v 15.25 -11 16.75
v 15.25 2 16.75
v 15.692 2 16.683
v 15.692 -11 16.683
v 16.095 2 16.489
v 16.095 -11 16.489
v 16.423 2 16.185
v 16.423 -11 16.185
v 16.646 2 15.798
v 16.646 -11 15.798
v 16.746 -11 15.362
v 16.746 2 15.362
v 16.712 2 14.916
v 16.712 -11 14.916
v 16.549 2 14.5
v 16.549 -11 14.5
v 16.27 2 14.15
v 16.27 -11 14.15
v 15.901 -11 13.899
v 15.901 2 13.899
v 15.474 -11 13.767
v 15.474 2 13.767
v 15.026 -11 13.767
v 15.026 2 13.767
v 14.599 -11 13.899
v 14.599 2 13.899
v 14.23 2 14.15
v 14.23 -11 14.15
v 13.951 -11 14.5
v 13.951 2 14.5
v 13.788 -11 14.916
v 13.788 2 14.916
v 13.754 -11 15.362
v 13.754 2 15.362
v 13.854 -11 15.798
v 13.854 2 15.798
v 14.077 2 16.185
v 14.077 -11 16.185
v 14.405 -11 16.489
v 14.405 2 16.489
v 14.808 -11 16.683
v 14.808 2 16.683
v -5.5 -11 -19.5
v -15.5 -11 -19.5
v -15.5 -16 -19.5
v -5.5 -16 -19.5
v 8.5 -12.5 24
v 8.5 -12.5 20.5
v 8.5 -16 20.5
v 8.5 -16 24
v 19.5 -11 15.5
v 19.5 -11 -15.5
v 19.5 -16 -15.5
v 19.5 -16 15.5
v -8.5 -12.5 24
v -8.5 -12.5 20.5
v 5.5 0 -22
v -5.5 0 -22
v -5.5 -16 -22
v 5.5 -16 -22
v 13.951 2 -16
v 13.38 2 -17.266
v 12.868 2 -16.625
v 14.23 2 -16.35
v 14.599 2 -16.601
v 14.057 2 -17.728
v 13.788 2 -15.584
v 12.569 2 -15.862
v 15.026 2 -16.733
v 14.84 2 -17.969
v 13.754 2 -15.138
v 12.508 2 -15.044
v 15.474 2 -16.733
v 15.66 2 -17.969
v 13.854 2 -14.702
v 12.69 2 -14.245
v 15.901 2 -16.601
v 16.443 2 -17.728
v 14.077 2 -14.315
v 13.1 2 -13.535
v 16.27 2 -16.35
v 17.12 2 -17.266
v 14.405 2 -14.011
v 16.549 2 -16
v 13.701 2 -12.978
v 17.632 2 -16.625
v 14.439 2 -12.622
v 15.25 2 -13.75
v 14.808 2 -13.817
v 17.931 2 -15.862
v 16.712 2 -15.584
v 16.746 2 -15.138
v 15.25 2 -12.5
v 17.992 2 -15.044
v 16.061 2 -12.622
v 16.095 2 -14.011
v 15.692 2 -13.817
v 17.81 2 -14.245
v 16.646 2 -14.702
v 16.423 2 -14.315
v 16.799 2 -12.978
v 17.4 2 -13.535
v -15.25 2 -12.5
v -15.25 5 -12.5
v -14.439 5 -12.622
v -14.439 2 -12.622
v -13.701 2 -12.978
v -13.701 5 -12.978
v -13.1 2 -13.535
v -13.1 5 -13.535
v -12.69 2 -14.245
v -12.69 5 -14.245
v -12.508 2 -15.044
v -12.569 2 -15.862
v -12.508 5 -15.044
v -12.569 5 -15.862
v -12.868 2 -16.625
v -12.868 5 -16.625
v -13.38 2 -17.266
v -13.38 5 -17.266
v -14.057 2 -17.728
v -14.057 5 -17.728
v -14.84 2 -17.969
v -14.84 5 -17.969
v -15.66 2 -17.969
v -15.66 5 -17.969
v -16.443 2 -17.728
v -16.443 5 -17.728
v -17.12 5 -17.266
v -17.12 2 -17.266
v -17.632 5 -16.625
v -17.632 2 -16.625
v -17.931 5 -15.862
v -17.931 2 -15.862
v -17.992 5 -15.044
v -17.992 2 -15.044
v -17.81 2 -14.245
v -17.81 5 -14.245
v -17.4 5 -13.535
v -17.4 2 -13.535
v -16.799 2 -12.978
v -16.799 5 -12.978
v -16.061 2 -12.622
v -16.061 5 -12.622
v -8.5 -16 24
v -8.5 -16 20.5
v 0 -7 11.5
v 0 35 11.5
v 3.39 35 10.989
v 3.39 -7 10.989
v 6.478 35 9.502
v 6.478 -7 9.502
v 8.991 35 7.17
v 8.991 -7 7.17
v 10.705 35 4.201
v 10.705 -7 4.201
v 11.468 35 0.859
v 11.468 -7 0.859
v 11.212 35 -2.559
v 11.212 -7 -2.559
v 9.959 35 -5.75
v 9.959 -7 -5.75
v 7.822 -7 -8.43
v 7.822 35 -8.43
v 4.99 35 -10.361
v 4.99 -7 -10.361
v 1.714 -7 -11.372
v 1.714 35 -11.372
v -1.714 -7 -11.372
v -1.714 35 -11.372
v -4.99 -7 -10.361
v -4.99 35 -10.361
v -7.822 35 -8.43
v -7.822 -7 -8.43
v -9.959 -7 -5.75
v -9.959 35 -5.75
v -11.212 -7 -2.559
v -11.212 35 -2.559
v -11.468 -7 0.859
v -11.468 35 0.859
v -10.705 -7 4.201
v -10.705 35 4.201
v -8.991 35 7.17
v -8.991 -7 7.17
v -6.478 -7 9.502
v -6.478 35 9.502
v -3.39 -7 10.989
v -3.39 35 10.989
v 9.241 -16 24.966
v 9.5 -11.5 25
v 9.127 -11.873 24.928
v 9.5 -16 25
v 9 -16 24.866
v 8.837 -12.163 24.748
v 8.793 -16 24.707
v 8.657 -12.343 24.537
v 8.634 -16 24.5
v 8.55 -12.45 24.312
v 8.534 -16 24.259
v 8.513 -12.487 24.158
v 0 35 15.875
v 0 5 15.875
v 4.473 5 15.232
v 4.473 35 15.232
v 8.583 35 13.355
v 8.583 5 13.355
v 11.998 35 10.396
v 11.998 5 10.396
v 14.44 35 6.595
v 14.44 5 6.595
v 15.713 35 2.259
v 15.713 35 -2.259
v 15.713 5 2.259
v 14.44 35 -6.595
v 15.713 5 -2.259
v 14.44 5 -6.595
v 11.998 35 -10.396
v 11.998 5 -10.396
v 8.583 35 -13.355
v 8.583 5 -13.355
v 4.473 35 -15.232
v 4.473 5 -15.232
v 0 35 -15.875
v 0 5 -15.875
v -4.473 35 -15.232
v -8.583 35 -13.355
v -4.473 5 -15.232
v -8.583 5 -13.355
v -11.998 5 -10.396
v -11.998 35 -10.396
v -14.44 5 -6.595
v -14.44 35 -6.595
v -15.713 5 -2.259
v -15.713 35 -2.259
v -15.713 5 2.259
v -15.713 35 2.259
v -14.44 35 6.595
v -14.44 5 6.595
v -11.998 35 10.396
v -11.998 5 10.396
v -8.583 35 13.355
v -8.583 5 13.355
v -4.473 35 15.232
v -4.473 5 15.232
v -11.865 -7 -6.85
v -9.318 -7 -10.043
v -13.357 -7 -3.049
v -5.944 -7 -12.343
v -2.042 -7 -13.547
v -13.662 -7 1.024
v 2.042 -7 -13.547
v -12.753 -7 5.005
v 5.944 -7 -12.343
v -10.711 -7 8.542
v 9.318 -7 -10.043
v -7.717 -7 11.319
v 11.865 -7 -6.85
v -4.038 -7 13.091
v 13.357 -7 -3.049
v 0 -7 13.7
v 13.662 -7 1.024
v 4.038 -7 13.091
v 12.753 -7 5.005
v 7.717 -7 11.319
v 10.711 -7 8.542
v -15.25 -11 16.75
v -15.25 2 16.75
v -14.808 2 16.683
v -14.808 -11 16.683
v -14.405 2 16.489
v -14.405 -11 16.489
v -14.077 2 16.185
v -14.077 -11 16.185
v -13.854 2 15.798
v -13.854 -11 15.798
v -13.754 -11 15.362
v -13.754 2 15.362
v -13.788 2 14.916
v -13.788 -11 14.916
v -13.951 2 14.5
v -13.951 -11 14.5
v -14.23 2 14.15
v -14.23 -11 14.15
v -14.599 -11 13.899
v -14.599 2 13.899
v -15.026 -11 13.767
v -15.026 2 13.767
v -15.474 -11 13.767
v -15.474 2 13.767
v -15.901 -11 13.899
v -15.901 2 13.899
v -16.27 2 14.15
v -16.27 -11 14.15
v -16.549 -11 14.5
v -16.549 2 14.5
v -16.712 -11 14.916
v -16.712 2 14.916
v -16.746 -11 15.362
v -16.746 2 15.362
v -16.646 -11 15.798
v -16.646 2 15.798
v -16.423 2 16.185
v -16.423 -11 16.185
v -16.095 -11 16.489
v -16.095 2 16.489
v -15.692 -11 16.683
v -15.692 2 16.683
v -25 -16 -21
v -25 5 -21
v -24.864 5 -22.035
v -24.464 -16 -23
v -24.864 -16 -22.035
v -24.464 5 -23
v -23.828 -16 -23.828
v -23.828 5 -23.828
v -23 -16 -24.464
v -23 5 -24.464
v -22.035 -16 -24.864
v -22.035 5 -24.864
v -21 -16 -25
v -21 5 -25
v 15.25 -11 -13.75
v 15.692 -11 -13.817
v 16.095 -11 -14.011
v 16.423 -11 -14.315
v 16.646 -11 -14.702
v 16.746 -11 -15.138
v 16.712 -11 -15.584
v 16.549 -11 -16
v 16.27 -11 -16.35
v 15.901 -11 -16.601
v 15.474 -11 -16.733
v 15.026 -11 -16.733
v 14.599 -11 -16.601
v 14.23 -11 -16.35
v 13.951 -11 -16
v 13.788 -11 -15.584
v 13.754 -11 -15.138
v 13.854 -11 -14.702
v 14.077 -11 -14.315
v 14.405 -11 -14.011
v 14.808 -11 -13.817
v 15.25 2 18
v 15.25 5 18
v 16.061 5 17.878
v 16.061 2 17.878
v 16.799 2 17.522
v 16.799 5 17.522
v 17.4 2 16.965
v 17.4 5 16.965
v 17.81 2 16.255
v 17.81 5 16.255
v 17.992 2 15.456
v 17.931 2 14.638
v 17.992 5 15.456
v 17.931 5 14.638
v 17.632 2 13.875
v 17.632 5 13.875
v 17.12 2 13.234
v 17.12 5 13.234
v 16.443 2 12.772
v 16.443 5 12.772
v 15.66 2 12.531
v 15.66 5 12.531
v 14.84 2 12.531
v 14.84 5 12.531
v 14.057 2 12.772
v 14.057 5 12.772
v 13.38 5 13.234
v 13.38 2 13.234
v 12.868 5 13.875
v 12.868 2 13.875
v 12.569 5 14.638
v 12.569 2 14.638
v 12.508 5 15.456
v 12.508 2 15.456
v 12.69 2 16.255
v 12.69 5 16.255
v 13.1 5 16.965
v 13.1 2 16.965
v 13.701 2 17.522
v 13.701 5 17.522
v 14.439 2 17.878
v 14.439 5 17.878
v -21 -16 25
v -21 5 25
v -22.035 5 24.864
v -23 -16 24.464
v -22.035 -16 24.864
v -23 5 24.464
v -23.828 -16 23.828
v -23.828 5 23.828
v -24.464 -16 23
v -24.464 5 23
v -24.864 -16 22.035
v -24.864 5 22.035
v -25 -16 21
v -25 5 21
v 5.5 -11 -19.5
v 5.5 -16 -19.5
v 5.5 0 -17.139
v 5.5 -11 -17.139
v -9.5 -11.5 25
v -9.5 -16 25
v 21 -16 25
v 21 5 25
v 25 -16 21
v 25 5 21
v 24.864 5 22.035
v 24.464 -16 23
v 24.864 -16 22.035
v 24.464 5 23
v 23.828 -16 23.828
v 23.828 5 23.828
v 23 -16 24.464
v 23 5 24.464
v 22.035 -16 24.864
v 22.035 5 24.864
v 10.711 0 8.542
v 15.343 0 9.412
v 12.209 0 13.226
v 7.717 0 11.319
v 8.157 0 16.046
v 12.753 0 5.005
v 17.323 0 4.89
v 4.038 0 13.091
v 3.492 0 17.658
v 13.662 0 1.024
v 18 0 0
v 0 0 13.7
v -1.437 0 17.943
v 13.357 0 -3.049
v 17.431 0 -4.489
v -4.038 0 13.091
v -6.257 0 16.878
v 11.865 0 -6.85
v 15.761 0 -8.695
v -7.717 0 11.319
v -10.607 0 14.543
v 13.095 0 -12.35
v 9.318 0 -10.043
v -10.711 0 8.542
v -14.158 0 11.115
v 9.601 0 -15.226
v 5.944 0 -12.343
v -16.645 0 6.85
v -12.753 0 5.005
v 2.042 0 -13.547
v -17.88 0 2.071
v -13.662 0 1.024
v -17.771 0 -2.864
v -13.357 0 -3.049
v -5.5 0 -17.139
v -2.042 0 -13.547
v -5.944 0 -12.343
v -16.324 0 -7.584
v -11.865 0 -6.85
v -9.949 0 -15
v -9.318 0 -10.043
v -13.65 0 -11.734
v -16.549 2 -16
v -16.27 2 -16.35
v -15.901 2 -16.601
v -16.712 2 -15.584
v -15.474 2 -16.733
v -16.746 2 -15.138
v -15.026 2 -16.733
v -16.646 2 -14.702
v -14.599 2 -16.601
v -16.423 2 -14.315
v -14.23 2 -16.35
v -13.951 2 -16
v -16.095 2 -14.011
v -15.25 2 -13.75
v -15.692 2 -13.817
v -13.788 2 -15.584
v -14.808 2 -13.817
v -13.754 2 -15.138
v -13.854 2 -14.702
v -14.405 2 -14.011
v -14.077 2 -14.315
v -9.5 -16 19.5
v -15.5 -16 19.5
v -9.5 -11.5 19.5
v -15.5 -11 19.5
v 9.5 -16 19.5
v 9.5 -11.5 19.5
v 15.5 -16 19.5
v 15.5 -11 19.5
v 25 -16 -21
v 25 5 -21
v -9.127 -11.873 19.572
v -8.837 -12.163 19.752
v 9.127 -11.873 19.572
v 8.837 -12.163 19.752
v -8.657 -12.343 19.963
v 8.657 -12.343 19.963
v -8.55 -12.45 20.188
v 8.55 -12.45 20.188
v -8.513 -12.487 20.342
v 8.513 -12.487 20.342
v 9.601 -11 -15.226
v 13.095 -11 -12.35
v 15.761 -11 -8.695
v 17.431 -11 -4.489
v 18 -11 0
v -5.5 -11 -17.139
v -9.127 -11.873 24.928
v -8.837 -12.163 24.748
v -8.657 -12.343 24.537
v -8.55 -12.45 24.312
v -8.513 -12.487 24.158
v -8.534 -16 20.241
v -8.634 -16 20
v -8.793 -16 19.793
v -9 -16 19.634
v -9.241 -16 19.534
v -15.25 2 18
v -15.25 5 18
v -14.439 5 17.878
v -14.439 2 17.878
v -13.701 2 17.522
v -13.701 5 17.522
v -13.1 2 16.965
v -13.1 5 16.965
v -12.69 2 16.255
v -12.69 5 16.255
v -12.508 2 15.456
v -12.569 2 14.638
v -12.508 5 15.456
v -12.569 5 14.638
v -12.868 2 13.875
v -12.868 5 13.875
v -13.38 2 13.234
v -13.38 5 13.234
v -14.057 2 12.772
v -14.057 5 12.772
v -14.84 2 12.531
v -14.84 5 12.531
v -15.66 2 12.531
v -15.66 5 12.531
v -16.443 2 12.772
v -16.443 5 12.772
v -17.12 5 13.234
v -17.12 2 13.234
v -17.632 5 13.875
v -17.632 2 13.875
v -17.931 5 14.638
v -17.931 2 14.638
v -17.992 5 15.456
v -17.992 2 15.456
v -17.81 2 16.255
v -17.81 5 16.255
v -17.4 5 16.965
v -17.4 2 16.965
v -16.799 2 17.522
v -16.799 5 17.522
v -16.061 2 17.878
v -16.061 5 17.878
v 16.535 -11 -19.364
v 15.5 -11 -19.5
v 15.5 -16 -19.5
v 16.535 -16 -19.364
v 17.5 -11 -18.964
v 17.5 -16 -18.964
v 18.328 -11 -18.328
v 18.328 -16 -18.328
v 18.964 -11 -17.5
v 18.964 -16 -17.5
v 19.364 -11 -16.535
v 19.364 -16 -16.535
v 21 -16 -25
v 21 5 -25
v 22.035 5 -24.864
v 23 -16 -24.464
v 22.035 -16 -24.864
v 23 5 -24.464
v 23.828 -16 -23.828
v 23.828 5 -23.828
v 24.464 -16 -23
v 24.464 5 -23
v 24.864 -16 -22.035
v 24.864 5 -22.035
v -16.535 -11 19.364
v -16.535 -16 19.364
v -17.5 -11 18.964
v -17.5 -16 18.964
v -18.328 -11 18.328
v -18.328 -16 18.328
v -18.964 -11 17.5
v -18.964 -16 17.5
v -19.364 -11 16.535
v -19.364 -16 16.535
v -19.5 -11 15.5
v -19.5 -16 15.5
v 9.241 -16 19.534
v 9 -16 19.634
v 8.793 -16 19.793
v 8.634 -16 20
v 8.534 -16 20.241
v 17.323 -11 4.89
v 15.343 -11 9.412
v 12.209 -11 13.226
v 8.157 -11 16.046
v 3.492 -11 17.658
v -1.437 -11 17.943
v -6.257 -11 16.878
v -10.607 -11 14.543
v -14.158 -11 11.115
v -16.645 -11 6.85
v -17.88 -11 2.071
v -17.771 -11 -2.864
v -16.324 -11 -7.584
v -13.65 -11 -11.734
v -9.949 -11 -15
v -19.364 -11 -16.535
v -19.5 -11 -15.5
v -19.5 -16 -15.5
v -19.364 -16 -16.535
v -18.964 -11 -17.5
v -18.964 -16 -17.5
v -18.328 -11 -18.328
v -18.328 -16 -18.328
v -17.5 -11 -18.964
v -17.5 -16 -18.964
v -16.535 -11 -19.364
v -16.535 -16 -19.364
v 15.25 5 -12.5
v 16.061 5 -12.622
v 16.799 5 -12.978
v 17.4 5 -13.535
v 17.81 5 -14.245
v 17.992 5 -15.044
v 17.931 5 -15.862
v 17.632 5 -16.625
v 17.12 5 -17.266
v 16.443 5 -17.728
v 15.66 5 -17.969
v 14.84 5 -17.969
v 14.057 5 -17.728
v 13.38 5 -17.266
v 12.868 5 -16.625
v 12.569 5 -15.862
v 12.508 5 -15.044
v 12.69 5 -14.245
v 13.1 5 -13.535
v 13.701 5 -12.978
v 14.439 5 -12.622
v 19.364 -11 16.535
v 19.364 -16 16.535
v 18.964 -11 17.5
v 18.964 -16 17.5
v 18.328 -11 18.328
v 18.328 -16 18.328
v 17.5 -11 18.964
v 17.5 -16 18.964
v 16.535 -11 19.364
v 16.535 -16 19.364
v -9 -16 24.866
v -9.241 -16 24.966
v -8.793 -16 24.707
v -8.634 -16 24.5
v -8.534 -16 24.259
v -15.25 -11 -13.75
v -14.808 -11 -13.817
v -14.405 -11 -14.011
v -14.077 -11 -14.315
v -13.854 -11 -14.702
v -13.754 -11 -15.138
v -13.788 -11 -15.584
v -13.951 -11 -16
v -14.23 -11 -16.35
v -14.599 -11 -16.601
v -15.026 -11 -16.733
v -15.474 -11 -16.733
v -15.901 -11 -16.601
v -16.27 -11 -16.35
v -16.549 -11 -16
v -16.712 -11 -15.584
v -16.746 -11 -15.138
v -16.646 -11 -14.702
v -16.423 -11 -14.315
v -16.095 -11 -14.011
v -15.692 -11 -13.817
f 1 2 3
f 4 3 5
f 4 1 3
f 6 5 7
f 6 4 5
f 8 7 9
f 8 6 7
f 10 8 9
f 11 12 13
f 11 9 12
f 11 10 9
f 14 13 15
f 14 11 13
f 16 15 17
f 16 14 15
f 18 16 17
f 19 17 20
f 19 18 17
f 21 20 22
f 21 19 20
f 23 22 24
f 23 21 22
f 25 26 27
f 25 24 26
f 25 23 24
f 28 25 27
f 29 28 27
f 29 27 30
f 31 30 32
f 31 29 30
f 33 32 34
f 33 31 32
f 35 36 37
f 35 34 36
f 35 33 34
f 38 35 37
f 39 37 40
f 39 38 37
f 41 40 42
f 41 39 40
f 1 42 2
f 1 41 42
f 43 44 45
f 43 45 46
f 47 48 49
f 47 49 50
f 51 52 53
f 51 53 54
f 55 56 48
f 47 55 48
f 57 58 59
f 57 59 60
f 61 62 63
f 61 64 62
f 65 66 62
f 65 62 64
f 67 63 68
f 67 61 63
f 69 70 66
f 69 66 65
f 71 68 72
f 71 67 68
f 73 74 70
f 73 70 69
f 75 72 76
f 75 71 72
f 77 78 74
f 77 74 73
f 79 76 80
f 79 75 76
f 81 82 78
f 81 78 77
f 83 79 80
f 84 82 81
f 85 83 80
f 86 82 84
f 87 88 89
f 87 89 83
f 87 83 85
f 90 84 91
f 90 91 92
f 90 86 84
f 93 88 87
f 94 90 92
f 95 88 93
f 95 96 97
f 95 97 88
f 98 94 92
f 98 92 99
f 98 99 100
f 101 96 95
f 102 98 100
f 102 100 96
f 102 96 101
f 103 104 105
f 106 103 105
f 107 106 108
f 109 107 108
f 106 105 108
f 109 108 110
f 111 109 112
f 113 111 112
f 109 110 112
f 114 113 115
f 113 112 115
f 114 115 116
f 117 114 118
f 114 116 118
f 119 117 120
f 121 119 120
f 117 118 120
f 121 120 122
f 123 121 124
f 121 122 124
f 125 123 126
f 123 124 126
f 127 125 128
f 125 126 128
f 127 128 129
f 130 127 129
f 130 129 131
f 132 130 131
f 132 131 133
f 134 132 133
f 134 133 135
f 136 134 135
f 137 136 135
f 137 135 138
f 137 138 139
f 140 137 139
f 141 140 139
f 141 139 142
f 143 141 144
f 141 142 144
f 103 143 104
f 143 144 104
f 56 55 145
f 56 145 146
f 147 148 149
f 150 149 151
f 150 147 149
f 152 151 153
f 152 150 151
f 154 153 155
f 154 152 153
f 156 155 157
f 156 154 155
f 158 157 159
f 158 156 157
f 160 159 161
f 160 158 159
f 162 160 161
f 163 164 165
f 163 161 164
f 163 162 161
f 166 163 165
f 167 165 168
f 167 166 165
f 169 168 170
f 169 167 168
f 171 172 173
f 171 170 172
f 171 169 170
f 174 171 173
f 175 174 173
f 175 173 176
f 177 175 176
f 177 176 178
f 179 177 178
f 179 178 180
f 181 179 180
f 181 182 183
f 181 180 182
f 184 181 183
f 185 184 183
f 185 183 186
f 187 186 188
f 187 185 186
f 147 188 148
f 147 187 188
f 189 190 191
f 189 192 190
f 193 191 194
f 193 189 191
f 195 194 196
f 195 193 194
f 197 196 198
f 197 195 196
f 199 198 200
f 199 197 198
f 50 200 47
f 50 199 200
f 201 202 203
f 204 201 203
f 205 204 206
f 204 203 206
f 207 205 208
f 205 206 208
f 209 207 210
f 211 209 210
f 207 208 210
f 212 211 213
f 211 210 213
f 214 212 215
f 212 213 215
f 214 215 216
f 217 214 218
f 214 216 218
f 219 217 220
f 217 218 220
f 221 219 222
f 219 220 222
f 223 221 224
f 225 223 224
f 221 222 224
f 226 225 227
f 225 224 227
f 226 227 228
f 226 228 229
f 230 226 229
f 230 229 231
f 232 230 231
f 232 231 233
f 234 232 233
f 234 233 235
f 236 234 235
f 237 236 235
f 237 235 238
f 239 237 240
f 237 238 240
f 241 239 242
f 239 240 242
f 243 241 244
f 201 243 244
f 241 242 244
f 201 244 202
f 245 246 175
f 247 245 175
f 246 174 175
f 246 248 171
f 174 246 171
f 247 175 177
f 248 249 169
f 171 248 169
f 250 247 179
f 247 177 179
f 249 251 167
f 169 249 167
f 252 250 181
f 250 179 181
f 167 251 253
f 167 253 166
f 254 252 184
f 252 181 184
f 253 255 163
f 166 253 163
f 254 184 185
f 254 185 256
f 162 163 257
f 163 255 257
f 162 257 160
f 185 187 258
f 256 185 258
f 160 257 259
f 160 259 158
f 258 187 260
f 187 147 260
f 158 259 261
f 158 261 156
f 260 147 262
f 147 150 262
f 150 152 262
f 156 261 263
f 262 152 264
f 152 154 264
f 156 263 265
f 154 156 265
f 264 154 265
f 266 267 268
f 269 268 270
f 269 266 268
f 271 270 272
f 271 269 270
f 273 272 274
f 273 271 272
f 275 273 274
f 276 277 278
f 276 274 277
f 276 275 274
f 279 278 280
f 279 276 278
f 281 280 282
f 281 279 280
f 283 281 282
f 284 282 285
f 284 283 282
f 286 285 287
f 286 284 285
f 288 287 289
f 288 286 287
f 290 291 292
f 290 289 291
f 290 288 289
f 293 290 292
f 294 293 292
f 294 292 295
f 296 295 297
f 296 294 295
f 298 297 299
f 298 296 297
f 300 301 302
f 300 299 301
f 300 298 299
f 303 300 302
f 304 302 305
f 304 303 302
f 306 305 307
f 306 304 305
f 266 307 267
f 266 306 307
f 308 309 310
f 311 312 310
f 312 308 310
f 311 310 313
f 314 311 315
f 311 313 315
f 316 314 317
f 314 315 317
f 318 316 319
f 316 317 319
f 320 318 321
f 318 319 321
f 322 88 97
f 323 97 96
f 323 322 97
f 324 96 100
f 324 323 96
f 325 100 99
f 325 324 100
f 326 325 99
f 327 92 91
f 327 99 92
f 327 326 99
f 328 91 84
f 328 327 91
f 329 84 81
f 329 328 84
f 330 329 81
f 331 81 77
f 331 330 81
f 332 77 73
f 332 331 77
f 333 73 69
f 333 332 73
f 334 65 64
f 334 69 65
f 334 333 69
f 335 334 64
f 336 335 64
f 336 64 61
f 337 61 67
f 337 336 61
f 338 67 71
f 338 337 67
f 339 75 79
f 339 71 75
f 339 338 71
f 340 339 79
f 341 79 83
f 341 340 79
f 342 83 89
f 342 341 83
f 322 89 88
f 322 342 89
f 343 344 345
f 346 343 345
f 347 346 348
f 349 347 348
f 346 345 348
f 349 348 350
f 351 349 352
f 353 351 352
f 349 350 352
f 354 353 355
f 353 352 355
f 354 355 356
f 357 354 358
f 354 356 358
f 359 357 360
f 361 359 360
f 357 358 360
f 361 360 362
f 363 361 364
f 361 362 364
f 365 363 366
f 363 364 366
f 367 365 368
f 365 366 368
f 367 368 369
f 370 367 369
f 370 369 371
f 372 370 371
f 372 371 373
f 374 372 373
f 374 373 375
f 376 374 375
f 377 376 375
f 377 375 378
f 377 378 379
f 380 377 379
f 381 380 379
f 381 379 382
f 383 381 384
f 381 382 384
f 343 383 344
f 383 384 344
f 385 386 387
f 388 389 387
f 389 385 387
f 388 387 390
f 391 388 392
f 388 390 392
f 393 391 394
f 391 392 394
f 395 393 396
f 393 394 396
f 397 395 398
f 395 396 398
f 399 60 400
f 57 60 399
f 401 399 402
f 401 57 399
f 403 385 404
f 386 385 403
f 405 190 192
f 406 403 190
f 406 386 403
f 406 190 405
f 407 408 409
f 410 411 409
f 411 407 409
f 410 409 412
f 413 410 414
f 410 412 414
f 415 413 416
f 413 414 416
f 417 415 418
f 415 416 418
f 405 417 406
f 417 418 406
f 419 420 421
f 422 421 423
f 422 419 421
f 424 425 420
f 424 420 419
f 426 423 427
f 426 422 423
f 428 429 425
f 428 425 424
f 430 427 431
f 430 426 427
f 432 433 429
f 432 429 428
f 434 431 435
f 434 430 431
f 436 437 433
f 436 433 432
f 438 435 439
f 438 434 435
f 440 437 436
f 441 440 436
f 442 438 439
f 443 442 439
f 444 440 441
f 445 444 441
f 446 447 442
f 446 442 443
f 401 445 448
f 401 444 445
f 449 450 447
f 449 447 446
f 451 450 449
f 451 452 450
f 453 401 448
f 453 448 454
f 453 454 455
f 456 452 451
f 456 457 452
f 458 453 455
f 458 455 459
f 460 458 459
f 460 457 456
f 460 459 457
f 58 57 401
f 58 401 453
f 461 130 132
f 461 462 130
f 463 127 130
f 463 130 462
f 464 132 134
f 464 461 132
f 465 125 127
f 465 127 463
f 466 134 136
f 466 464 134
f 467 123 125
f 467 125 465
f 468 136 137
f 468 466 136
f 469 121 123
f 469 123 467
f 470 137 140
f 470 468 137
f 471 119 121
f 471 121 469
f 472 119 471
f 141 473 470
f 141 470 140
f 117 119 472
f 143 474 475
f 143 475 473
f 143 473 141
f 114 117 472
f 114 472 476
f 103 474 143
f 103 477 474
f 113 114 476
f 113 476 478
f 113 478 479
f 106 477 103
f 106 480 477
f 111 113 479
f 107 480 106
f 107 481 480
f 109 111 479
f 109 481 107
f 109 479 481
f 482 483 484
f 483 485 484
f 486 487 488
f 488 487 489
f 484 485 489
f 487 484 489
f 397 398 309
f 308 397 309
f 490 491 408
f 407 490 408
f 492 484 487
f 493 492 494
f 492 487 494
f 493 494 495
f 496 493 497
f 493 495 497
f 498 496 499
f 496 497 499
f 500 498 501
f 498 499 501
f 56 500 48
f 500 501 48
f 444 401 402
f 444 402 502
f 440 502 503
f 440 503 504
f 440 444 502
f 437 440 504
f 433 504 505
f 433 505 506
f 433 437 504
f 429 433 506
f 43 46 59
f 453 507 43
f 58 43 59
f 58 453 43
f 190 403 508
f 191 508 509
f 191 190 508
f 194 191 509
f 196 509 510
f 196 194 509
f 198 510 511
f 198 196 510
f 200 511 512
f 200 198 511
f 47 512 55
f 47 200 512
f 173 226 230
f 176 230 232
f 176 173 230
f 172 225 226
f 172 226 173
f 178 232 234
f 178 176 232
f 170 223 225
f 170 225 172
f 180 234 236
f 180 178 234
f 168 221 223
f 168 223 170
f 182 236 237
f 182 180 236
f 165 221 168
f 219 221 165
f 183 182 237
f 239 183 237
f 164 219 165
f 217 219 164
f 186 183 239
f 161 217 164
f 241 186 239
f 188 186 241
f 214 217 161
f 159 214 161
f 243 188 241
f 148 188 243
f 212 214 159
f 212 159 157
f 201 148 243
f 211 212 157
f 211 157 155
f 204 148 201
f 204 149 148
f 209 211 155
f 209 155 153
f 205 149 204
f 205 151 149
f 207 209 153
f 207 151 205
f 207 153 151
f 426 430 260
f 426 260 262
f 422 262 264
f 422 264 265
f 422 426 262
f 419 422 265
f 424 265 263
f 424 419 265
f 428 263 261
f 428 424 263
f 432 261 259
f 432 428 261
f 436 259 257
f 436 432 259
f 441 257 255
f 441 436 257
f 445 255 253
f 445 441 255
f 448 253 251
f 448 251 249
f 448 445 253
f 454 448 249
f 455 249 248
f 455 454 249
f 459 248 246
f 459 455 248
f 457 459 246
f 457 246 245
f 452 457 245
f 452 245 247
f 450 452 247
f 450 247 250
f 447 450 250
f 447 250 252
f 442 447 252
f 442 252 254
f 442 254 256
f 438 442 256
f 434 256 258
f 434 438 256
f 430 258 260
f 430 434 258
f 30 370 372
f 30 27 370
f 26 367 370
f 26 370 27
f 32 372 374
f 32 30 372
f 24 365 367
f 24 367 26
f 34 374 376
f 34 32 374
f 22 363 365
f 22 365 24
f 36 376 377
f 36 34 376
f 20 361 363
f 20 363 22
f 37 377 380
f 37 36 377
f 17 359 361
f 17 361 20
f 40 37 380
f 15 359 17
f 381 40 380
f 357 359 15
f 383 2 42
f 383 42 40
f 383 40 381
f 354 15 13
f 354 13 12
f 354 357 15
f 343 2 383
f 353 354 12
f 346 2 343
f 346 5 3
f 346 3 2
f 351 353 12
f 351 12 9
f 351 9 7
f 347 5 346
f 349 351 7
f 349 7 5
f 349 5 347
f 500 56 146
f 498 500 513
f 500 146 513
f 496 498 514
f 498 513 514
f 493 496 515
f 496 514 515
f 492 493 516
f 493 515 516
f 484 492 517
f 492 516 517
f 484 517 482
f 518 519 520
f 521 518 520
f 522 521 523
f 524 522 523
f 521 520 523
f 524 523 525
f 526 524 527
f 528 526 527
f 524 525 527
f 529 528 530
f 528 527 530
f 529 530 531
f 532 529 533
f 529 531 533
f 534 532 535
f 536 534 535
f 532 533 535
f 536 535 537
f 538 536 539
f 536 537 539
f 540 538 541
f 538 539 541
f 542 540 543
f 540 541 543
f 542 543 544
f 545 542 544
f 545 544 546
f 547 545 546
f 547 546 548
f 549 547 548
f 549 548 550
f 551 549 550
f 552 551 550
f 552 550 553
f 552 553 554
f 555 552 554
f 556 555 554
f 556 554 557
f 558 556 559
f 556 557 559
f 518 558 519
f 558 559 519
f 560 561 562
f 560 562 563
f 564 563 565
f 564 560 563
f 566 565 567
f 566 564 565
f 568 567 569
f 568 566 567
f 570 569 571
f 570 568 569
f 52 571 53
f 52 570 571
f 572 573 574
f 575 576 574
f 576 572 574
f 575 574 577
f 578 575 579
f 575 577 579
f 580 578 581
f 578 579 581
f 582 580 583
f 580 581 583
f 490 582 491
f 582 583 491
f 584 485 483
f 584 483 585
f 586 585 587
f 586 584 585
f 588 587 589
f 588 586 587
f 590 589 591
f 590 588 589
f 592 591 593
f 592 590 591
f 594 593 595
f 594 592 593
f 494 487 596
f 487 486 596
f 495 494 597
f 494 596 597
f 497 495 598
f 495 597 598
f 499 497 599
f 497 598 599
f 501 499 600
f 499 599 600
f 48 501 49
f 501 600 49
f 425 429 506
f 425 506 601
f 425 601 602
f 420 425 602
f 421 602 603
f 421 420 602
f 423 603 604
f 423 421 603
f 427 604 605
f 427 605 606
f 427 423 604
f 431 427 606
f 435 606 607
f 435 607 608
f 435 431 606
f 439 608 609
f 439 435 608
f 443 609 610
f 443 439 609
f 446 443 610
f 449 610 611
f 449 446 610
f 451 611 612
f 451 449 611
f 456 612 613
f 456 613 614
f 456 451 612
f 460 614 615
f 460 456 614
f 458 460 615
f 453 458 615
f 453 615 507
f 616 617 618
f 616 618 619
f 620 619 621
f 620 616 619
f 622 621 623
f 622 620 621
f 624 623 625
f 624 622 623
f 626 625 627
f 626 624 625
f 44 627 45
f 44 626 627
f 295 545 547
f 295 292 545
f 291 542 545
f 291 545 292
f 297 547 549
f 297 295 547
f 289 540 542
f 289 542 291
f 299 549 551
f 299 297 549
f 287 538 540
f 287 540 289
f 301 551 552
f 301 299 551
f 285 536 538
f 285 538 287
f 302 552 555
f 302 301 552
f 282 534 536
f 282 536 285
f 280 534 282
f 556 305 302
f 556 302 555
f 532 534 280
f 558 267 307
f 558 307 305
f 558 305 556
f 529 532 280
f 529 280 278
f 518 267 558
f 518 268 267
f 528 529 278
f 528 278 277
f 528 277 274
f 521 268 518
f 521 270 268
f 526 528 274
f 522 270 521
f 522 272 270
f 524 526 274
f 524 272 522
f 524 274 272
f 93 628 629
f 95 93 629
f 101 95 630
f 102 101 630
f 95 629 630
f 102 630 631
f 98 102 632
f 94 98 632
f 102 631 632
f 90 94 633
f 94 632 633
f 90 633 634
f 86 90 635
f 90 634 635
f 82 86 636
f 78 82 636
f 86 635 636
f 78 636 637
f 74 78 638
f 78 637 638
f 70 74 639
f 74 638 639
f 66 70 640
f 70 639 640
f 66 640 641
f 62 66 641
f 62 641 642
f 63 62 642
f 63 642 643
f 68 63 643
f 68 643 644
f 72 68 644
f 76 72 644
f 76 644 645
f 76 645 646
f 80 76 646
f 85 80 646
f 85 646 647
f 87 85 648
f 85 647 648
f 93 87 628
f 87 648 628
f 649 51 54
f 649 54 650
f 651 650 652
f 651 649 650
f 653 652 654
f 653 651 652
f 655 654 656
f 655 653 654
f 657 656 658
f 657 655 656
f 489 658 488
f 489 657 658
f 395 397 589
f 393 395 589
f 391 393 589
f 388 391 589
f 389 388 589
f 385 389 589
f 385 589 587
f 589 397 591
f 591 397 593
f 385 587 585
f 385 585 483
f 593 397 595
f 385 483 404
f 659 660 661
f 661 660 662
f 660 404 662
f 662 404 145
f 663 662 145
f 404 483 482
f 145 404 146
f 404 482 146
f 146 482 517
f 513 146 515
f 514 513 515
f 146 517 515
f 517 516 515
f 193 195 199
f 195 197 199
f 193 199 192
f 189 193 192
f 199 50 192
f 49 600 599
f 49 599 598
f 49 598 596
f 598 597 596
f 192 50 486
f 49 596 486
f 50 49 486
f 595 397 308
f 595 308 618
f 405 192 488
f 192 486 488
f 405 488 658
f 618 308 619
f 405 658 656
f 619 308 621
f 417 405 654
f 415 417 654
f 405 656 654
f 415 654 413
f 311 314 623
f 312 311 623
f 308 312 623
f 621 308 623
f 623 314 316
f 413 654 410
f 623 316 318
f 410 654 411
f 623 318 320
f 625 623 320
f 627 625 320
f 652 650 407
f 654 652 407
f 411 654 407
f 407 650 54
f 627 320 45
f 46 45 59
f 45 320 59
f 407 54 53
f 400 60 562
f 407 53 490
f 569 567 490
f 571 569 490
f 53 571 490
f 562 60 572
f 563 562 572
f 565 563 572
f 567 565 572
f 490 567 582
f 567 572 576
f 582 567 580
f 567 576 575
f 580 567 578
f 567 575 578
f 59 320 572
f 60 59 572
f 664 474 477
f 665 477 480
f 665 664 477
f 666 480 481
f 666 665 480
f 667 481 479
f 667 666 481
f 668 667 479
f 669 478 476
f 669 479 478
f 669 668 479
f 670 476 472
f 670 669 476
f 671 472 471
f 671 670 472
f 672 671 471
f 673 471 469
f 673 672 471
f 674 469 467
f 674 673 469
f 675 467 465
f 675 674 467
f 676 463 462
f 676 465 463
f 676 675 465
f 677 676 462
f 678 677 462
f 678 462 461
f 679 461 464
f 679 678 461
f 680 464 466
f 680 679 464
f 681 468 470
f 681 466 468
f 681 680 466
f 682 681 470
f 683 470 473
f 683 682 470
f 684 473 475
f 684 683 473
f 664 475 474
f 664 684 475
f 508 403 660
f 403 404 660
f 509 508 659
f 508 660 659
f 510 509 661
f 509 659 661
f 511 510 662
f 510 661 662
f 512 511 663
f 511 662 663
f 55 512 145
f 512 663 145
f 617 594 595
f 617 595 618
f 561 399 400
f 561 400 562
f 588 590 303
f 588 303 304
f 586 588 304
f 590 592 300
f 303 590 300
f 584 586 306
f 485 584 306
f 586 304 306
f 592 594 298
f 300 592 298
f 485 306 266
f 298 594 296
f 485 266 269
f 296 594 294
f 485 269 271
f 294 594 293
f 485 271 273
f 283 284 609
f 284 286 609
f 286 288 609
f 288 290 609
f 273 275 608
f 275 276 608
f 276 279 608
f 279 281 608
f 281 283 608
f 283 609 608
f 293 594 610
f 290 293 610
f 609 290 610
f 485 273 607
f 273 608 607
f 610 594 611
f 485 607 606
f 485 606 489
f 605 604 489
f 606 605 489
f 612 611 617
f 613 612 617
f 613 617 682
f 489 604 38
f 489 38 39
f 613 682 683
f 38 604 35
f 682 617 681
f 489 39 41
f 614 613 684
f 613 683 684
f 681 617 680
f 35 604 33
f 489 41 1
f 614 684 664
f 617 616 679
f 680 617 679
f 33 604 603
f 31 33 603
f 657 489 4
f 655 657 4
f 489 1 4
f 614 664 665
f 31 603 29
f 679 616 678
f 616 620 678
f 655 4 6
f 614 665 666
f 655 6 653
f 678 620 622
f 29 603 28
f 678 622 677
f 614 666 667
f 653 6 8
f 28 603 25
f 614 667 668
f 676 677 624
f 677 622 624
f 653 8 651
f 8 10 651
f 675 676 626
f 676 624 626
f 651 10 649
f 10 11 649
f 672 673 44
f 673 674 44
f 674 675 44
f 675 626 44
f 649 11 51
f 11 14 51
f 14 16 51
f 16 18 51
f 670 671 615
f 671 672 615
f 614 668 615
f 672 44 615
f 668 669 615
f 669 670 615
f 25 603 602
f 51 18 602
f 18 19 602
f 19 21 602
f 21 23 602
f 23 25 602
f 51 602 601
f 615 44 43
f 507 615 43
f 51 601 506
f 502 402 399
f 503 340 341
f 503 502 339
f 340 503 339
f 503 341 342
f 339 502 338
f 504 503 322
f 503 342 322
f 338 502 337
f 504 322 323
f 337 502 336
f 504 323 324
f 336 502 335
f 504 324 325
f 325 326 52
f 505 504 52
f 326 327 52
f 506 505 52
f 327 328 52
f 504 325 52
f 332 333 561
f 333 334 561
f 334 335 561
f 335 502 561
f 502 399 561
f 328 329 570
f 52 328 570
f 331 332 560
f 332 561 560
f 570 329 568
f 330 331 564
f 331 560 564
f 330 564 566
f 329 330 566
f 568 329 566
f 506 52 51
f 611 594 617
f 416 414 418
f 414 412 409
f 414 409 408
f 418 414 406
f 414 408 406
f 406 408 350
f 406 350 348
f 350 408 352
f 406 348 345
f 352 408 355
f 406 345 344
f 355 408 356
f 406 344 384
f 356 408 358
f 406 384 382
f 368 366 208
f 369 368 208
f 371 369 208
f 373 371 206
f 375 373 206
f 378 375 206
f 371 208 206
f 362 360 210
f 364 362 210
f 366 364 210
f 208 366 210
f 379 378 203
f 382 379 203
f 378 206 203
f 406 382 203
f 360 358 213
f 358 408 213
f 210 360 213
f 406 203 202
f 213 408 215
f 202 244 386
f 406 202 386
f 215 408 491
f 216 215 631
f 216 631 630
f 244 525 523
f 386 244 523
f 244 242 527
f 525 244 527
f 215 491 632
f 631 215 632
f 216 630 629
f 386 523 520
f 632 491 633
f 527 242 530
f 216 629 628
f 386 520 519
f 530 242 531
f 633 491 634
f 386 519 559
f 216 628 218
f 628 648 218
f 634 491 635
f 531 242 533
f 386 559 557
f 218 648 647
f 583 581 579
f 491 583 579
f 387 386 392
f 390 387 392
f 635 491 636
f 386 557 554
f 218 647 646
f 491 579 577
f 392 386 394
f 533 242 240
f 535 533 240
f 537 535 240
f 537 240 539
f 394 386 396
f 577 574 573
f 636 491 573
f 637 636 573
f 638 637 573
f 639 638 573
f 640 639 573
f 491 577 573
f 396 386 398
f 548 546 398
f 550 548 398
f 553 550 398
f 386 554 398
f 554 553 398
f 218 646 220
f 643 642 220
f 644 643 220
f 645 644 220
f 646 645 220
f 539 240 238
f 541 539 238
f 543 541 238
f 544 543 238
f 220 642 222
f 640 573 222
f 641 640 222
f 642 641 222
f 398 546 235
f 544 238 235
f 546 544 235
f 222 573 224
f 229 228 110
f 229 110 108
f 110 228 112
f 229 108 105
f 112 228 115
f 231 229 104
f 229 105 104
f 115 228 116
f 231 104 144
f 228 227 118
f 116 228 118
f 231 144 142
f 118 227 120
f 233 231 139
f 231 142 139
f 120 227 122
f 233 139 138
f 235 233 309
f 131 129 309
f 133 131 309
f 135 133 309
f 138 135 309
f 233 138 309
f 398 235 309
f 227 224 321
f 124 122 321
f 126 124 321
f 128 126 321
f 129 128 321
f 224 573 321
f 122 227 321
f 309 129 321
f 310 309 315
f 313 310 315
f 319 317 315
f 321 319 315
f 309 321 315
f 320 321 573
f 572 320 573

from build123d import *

# Parameters (mm, degrees)
BOSS_EXTRUDE1_DEPTH     = 16
SKETCH4_3_R             = 2.75
SKETCH4_3_R_2           = 1.5
BOSS_EXTRUDE2_DEPTH     = 11
SKETCH4_4_R             = 13.7
BOSS_EXTRUDE3_DEPTH     = 7
BOSS_EXTRUDE4_START     = 5
BOSS_EXTRUDE4_DEPTH     = 5
BOSS_EXTRUDE5_START     = 5
SKETCH4_6_R             = 15.875
BOSS_EXTRUDE5_DEPTH     = 30
CUT_EXTRUDE1_DEPTH      = 50.749371855
CUT_EXTRUDE1_DEPTH_BACK = 7
SKETCH4_7_R             = 11.5
CUT_EXTRUDE4_DEPTH      = 50.749371855
CUT_EXTRUDE4_DEPTH_BACK = 50.749371855
SKETCH4_8_R             = 1.5
CUT_EXTRUDE5_START      = 5
SKETCH4_9_R             = 2.75
CUT_EXTRUDE5_DEPTH      = 3
SKETCH4_10_W            = 17
SKETCH4_10_H            = 5.5
BOSS_EXTRUDE6_DEPTH     = 12.5
FILLET1_R               = 1


with BuildPart() as part:
    # Sketch4 → Boss-Extrude1 (new body)
    with BuildSketch(Plane(origin=(0, 0, 0), x_dir=(1, 0, 0), z_dir=(0, 1, 0))):
        with BuildLine():
            Line((8.5, -25), (21, -25))
            ThreePointArc((21, -25), (23.828427125, -23.828427125), (25, -21))
            Line((25, -21), (25, 21))
            ThreePointArc((25, 21), (23.828427125, 23.828427125), (21, 25))
            Line((21, 25), (-21, 25))
            ThreePointArc((-21, 25), (-23.828427125, 23.828427125), (-25, 21))
            Line((-25, 21), (-25, -21))
            ThreePointArc((-25, -21), (-23.828427125, -23.828427125), (-21, -25))
            Line((-21, -25), (-8.5, -25))
            Line((-8.5, -25), (-8.5, -19.5))
            Line((-8.5, -19.5), (-15.5, -19.5))
            ThreePointArc((-15.5, -19.5), (-18.328427125, -18.328427125), (-19.5, -15.5))
            Line((-19.5, -15.5), (-19.5, 15.5))
            ThreePointArc((-19.5, 15.5), (-18.328427125, 18.328427125), (-15.5, 19.5))
            Line((-15.5, 19.5), (-5.5, 19.5))
            Line((-5.5, 19.5), (-5.5, 22))
            Line((-5.5, 22), (5.5, 22))
            Line((5.5, 22), (5.5, 19.5))
            Line((5.5, 19.5), (15.5, 19.5))
            ThreePointArc((15.5, 19.5), (18.328427125, 18.328427125), (19.5, 15.5))
            Line((19.5, 15.5), (19.5, -15.5))
            ThreePointArc((19.5, -15.5), (18.328427125, -18.328427125), (15.5, -19.5))
            Line((15.5, -19.5), (8.5, -19.5))
            Line((8.5, -19.5), (8.5, -25))
        make_face()
    extrude(amount=-BOSS_EXTRUDE1_DEPTH)

    # Sketch4<3> → Boss-Extrude2 (add)
    # profile 1 of 7: a face of its own
    with BuildSketch(Plane(origin=(0, 0, 0), x_dir=(1, 0, 0), z_dir=(0, 1, 0))):
        with BuildLine():
            Line((-8.5, -19.5), (8.5, -19.5))
            Line((8.5, -19.5), (15.5, -19.5))
            ThreePointArc((15.5, -19.5), (18.328427125, -18.328427125), (19.5, -15.5))
            Line((19.5, -15.5), (19.5, 15.5))
            ThreePointArc((19.5, 15.5), (18.328427125, 18.328427125), (15.5, 19.5))
            Line((15.5, 19.5), (5.5, 19.5))
            Line((5.5, 19.5), (5.5, 17.139136501))
            ThreePointArc((5.5, 17.139136501), (14.543039572, 10.606601718), (18, 0))
            ThreePointArc((18, 0), (-10.606601718, -14.543039572), (-5.5, 17.139136501))
            Line((-5.5, 17.139136501), (-5.5, 19.5))
            Line((-5.5, 19.5), (-15.5, 19.5))
            ThreePointArc((-15.5, 19.5), (-18.328427125, 18.328427125), (-19.5, 15.5))
            Line((-19.5, 15.5), (-19.5, -15.5))
            ThreePointArc((-19.5, -15.5), (-18.328427125, -18.328427125), (-15.5, -19.5))
            Line((-15.5, -19.5), (-8.5, -19.5))
        make_face()
        with Locations((-15.25, -15.25)):
            Circle(SKETCH4_3_R, mode=Mode.SUBTRACT)
        with Locations((15.25, -15.25)):
            Circle(SKETCH4_3_R, mode=Mode.SUBTRACT)
        with Locations((-15.25, 15.25)):
            Circle(SKETCH4_3_R, mode=Mode.SUBTRACT)
        with Locations((15.25, 15.25)):
            Circle(SKETCH4_3_R, mode=Mode.SUBTRACT)
    # profile 2 of 7: a face of its own
    with BuildSketch(Plane(origin=(0, 0, 0), x_dir=(1, 0, 0), z_dir=(0, 1, 0))):
        with BuildLine():
            Line((-8.5, -19.5), (8.5, -19.5))
            Line((8.5, -19.5), (15.5, -19.5))
            ThreePointArc((15.5, -19.5), (18.328427125, -18.328427125), (19.5, -15.5))
            Line((19.5, -15.5), (19.5, 15.5))
            ThreePointArc((19.5, 15.5), (18.328427125, 18.328427125), (15.5, 19.5))
            Line((15.5, 19.5), (5.5, 19.5))
            Line((5.5, 19.5), (5.5, 17.139136501))
            ThreePointArc((5.5, 17.139136501), (14.543039572, 10.606601718), (18, 0))
            ThreePointArc((18, 0), (-10.606601718, -14.543039572), (-5.5, 17.139136501))
            Line((-5.5, 17.139136501), (-5.5, 19.5))
            Line((-5.5, 19.5), (-15.5, 19.5))
            ThreePointArc((-15.5, 19.5), (-18.328427125, 18.328427125), (-19.5, 15.5))
            Line((-19.5, 15.5), (-19.5, -15.5))
            ThreePointArc((-19.5, -15.5), (-18.328427125, -18.328427125), (-15.5, -19.5))
            Line((-15.5, -19.5), (-8.5, -19.5))
        make_face()
        with Locations((-15.25, -15.25)):
            Circle(SKETCH4_3_R, mode=Mode.SUBTRACT)
        with Locations((15.25, -15.25)):
            Circle(SKETCH4_3_R, mode=Mode.SUBTRACT)
        with Locations((-15.25, 15.25)):
            Circle(SKETCH4_3_R, mode=Mode.SUBTRACT)
        with Locations((15.25, 15.25)):
            Circle(SKETCH4_3_R, mode=Mode.SUBTRACT)
    # profile 3 of 7: a face of its own
    with BuildSketch(Plane(origin=(0, 0, 0), x_dir=(1, 0, 0), z_dir=(0, 1, 0))):
        with BuildLine():
            Line((-8.5, -19.5), (8.5, -19.5))
            Line((8.5, -19.5), (15.5, -19.5))
            ThreePointArc((15.5, -19.5), (18.328427125, -18.328427125), (19.5, -15.5))
            Line((19.5, -15.5), (19.5, 15.5))
            ThreePointArc((19.5, 15.5), (18.328427125, 18.328427125), (15.5, 19.5))
            Line((15.5, 19.5), (5.5, 19.5))
            Line((5.5, 19.5), (5.5, 17.139136501))
            ThreePointArc((5.5, 17.139136501), (14.543039572, 10.606601718), (18, 0))
            ThreePointArc((18, 0), (-10.606601718, -14.543039572), (-5.5, 17.139136501))
            Line((-5.5, 17.139136501), (-5.5, 19.5))
            Line((-5.5, 19.5), (-15.5, 19.5))
            ThreePointArc((-15.5, 19.5), (-18.328427125, 18.328427125), (-19.5, 15.5))
            Line((-19.5, 15.5), (-19.5, -15.5))
            ThreePointArc((-19.5, -15.5), (-18.328427125, -18.328427125), (-15.5, -19.5))
            Line((-15.5, -19.5), (-8.5, -19.5))
        make_face()
        with Locations((-15.25, -15.25)):
            Circle(SKETCH4_3_R, mode=Mode.SUBTRACT)
        with Locations((15.25, -15.25)):
            Circle(SKETCH4_3_R, mode=Mode.SUBTRACT)
        with Locations((-15.25, 15.25)):
            Circle(SKETCH4_3_R, mode=Mode.SUBTRACT)
        with Locations((15.25, 15.25)):
            Circle(SKETCH4_3_R, mode=Mode.SUBTRACT)
    # profile 4 of 7: a face of its own
    with BuildSketch(Plane(origin=(0, 0, 0), x_dir=(1, 0, 0), z_dir=(0, 1, 0))):
        with Locations((-15.25, -15.25)):
            Circle(SKETCH4_3_R)
        with Locations(Location((-15.25, -15.25, 0), (0, 0, 270))):
            Circle(SKETCH4_3_R_2, mode=Mode.SUBTRACT)
    # profile 5 of 7: a face of its own
    with BuildSketch(Plane(origin=(0, 0, 0), x_dir=(1, 0, 0), z_dir=(0, 1, 0))):
        with Locations((15.25, -15.25)):
            Circle(SKETCH4_3_R)
        with Locations(Location((15.25, -15.25, 0), (0, 0, 270))):
            Circle(SKETCH4_3_R_2, mode=Mode.SUBTRACT)
    # profile 6 of 7: a face of its own
    with BuildSketch(Plane(origin=(0, 0, 0), x_dir=(1, 0, 0), z_dir=(0, 1, 0))):
        with Locations((15.25, 15.25)):
            Circle(SKETCH4_3_R)
        with Locations(Location((15.25, 15.25, 0), (0, 0, 270))):
            Circle(SKETCH4_3_R_2, mode=Mode.SUBTRACT)
    # profile 7 of 7: a face of its own
    with BuildSketch(Plane(origin=(0, 0, 0), x_dir=(1, 0, 0), z_dir=(0, 1, 0))):
        with Locations((-15.25, 15.25)):
            Circle(SKETCH4_3_R)
        with Locations(Location((-15.25, 15.25, 0), (0, 0, 270))):
            Circle(SKETCH4_3_R_2, mode=Mode.SUBTRACT)
    extrude(amount=-BOSS_EXTRUDE2_DEPTH)



with BuildPart() as body_2:
    # Sketch4<4> → Boss-Extrude3 (new body)
    with BuildSketch(Plane(origin=(0, 0, 0), x_dir=(1, 0, 0), z_dir=(0, 1, 0))):
        with Locations(Location((0, 0, 0), (0, 0, 270))):
            Circle(SKETCH4_4_R)
    extrude(amount=-BOSS_EXTRUDE3_DEPTH)

    # Sketch4<5> → Boss-Extrude4 (add)
    with BuildSketch(Plane(origin=(0, 0, 0), x_dir=(1, 0, 0), z_dir=(0, 1, 0)).offset(BOSS_EXTRUDE4_START)):
        with BuildLine():
            Line((21, -25), (-21, -25))
            ThreePointArc((-21, -25), (-23.828427125, -23.828427125), (-25, -21))
            Line((-25, -21), (-25, 21))
            ThreePointArc((-25, 21), (-23.828427125, 23.828427125), (-21, 25))
            Line((-21, 25), (21, 25))
            ThreePointArc((21, 25), (23.828427125, 23.828427125), (25, 21))
            Line((25, 21), (25, -21))
            ThreePointArc((25, -21), (23.828427125, -23.828427125), (21, -25))
        make_face()
    extrude(amount=-BOSS_EXTRUDE4_DEPTH)

    # Sketch4<6> → Boss-Extrude5 (add)
    with BuildSketch(Plane(origin=(0, 0, 0), x_dir=(1, 0, 0), z_dir=(0, 1, 0)).offset(BOSS_EXTRUDE5_START)):
        with Locations(Location((0, 0, 0), (0, 0, 270))):
            Circle(SKETCH4_6_R)
    extrude(amount=BOSS_EXTRUDE5_DEPTH)

    # Sketch4<7> → Cut-Extrude1 (cut, two sides: drawn at the far end of the back side and taken through both)
    with BuildSketch(Plane(origin=(0, 0, 0), x_dir=(1, 0, 0), z_dir=(0, 1, 0)).offset(-CUT_EXTRUDE1_DEPTH_BACK)):
        with Locations(Location((0, 0, 0), (0, 0, 270))):
            Circle(SKETCH4_7_R)
    extrude(amount=CUT_EXTRUDE1_DEPTH + CUT_EXTRUDE1_DEPTH_BACK, mode=Mode.SUBTRACT)

    # Sketch4<8> → Cut-Extrude4 (cut, two sides: drawn at the far end of the back side and taken through both)
    with BuildSketch(Plane(origin=(0, 0, 0), x_dir=(1, 0, 0), z_dir=(0, 1, 0)).offset(-CUT_EXTRUDE4_DEPTH_BACK)):
        with Locations(Location((15.25, -15.25, 0), (0, 0, 270))):
            Circle(SKETCH4_8_R)
        with Locations(Location((-15.25, -15.25, 0), (0, 0, 270))):
            Circle(SKETCH4_8_R)
        with Locations(Location((-15.25, 15.25, 0), (0, 0, 270))):
            Circle(SKETCH4_8_R)
        with Locations(Location((15.25, 15.25, 0), (0, 0, 270))):
            Circle(SKETCH4_8_R)
    extrude(amount=CUT_EXTRUDE4_DEPTH + CUT_EXTRUDE4_DEPTH_BACK, mode=Mode.SUBTRACT)

    # Sketch4<9> → Cut-Extrude5 (cut)
    with BuildSketch(Plane(origin=(0, 0, 0), x_dir=(1, 0, 0), z_dir=(0, 1, 0)).offset(CUT_EXTRUDE5_START)):
        with Locations(Location((-15.25, -15.25, 0), (0, 0, 270))):
            Circle(SKETCH4_9_R)
        with Locations(Location((15.25, -15.25, 0), (0, 0, 270))):
            Circle(SKETCH4_9_R)
        with Locations(Location((15.25, 15.25, 0), (0, 0, 270))):
            Circle(SKETCH4_9_R)
        with Locations(Location((-15.25, 15.25, 0), (0, 0, 270))):
            Circle(SKETCH4_9_R)
    extrude(amount=-CUT_EXTRUDE5_DEPTH, mode=Mode.SUBTRACT)


with BuildPart() as part_1:
    add(part.part)

    add(body_2.part)  # Boss-Extrude6 merges body 2
    # Sketch4<10> → Boss-Extrude6 (add)
    with BuildSketch(Plane(origin=(0, 0, 0), x_dir=(1, 0, 0), z_dir=(0, 1, 0))):
        with Locations((0, -22.25)):
            Rectangle(SKETCH4_10_W, SKETCH4_10_H)
    extrude(amount=-BOSS_EXTRUDE6_DEPTH)

    # Fillet1
    fillet1_edges = [part_1.edges().sort_by_distance(p)[0] for p in [
        (0, -12.5, 19.5),
        (0, -12.5, 25),
        (-8.5, -14.25, 19.5),
        (-8.5, -14.25, 25),
        (8.5, -14.25, 25),
        (8.5, -14.25, 19.5),
    ]]
    fillet(fillet1_edges, radius=FILLET1_R)


solid = part_1.part
